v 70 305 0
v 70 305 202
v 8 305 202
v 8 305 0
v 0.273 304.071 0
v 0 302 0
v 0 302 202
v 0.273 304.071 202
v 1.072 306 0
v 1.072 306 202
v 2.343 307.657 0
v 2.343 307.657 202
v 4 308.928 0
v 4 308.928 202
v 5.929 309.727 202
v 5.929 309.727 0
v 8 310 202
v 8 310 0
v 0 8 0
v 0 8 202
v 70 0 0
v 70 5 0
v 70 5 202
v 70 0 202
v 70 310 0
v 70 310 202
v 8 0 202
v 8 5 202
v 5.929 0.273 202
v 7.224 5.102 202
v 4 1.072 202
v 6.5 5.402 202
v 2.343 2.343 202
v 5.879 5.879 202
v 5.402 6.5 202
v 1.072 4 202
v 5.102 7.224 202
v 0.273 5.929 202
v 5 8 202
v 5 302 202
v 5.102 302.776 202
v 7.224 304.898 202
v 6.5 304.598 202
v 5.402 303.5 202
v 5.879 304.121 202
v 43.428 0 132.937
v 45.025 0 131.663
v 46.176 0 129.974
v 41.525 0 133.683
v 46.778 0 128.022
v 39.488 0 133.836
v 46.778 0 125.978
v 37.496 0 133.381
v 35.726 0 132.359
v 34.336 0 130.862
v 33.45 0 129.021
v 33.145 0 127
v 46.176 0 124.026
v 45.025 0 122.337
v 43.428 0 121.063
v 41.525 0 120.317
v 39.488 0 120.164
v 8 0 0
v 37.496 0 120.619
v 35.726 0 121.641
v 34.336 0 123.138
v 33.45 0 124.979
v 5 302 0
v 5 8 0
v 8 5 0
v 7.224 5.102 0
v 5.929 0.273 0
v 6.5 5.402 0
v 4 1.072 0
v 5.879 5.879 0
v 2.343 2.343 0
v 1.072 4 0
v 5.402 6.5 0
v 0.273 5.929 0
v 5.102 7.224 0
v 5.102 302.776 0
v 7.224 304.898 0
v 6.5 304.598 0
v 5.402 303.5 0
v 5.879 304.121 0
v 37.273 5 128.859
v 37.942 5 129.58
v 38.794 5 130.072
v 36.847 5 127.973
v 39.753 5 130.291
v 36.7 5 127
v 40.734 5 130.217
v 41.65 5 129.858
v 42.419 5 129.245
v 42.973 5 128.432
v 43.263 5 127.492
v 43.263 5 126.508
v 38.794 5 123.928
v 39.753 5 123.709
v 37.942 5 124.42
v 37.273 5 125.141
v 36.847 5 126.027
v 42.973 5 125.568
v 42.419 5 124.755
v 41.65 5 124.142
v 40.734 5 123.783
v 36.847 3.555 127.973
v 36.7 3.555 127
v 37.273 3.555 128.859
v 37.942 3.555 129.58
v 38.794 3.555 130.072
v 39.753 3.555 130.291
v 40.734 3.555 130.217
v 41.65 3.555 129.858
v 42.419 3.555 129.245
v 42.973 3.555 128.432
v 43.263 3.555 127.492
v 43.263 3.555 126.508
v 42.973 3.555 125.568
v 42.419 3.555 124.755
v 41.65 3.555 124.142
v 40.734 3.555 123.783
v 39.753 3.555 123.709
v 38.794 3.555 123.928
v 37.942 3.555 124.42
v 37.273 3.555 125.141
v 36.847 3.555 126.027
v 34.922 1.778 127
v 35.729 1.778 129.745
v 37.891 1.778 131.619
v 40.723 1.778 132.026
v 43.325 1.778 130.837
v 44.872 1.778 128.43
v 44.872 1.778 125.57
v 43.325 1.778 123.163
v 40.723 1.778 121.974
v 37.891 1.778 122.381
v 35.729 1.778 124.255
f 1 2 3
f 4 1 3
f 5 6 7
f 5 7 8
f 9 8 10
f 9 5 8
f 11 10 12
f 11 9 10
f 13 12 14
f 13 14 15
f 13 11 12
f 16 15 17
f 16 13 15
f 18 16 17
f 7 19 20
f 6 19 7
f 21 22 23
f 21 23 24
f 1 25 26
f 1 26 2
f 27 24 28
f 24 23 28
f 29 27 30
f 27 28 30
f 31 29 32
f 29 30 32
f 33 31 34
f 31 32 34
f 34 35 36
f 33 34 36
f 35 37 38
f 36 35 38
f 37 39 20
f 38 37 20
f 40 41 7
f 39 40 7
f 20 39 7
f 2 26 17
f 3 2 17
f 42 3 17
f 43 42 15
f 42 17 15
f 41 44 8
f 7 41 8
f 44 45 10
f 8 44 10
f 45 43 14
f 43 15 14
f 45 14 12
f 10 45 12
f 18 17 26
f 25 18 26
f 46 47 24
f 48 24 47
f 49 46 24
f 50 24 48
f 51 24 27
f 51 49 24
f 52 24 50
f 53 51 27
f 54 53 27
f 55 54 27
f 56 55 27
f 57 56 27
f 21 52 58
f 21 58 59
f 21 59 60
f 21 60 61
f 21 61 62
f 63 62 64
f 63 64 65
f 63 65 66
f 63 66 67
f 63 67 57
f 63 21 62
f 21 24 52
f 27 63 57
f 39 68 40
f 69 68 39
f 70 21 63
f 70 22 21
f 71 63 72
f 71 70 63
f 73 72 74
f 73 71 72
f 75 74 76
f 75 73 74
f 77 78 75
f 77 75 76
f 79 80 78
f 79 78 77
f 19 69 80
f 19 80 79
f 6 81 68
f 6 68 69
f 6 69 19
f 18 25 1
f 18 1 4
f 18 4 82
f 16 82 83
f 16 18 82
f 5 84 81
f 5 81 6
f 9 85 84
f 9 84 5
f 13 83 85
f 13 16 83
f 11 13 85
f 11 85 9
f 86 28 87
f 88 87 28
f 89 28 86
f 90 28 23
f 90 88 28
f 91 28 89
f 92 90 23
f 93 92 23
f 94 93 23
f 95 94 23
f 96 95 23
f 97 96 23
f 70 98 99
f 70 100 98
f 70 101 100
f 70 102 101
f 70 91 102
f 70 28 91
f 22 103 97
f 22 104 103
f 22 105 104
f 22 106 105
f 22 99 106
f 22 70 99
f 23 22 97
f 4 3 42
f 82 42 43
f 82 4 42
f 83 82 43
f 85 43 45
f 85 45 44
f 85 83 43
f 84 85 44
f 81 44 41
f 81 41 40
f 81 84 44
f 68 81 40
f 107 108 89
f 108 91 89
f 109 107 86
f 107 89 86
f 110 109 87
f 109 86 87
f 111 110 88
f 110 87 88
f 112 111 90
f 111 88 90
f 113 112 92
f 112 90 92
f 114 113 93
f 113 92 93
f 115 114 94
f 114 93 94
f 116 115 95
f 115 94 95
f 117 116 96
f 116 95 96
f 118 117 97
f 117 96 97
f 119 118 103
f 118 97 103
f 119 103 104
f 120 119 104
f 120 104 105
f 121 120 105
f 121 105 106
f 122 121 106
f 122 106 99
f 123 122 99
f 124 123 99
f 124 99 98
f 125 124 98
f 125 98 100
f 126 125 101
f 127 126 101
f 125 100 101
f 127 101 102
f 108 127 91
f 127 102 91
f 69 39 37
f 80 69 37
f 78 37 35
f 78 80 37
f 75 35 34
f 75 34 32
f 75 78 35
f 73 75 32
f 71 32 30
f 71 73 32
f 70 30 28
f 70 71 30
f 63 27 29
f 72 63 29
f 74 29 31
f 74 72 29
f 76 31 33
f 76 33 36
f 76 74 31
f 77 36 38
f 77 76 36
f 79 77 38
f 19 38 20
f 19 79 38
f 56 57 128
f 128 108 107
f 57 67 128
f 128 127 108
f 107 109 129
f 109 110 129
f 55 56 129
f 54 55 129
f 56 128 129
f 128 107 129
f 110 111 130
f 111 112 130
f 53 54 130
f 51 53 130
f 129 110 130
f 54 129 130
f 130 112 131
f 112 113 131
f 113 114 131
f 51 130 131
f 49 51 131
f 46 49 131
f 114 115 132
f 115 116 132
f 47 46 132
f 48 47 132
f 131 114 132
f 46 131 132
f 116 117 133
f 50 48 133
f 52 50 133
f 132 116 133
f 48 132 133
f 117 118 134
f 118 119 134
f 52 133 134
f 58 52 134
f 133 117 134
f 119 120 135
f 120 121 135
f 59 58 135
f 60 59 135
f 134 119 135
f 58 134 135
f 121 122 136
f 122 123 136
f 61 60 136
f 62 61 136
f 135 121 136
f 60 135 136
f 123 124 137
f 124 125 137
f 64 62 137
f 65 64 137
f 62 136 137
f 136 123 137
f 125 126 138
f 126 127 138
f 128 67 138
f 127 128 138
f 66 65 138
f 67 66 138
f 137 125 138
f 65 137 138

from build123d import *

# Parameters (mm, degrees)
EXTRUDE_1_DEPTH             = 202
HOLE_WIZARD_M61_D           = 6.6
HOLE_WIZARD_M61_DEPTH       = 10
HOLE_WIZARD_M61_CSINK_D     = 13.71
HOLE_WIZARD_M61_CSINK_ANGLE = 90
HOLE_WIZARD_M61_TIP         = 1.982840043


with BuildPart() as part:
    # Эскиз1 → Бобышка-Вытянуть1 (new body)
    with BuildSketch(Plane.XY):
        with BuildLine():
            Line((70, 0), (8, 0))
            ThreePointArc((8, 0), (2.343145751, 2.343145751), (0, 8))
            Line((0, 8), (0, 302))
            ThreePointArc((0, 302), (2.343145751, 307.656854249), (8, 310))
            Line((8, 310), (70, 310))
            Line((70, 310), (70, 305))
            Line((70, 305), (8, 305))
            ThreePointArc((8, 305), (5.878679656, 304.121320344), (5, 302))
            Line((5, 302), (5, 8))
            ThreePointArc((5, 8), (5.878679656, 5.878679656), (8, 5))
            Line((8, 5), (70, 5))
            Line((70, 5), (70, 0))
        make_face()
    extrude(amount=EXTRUDE_1_DEPTH)

    # Зенковка для винта с потайной головкой и внутренним шестигранником M61
    with Locations(Plane.XZ):
        with Locations((40, 127)):
            CounterSinkHole(HOLE_WIZARD_M61_D / 2, HOLE_WIZARD_M61_CSINK_D / 2, depth=HOLE_WIZARD_M61_DEPTH, counter_sink_angle=HOLE_WIZARD_M61_CSINK_ANGLE)
            with Locations((0, 0, -(HOLE_WIZARD_M61_DEPTH + HOLE_WIZARD_M61_TIP / 2))):  # 118° drill point
                Cone(0, HOLE_WIZARD_M61_D / 2, HOLE_WIZARD_M61_TIP, mode=Mode.SUBTRACT)


solid = part.part
